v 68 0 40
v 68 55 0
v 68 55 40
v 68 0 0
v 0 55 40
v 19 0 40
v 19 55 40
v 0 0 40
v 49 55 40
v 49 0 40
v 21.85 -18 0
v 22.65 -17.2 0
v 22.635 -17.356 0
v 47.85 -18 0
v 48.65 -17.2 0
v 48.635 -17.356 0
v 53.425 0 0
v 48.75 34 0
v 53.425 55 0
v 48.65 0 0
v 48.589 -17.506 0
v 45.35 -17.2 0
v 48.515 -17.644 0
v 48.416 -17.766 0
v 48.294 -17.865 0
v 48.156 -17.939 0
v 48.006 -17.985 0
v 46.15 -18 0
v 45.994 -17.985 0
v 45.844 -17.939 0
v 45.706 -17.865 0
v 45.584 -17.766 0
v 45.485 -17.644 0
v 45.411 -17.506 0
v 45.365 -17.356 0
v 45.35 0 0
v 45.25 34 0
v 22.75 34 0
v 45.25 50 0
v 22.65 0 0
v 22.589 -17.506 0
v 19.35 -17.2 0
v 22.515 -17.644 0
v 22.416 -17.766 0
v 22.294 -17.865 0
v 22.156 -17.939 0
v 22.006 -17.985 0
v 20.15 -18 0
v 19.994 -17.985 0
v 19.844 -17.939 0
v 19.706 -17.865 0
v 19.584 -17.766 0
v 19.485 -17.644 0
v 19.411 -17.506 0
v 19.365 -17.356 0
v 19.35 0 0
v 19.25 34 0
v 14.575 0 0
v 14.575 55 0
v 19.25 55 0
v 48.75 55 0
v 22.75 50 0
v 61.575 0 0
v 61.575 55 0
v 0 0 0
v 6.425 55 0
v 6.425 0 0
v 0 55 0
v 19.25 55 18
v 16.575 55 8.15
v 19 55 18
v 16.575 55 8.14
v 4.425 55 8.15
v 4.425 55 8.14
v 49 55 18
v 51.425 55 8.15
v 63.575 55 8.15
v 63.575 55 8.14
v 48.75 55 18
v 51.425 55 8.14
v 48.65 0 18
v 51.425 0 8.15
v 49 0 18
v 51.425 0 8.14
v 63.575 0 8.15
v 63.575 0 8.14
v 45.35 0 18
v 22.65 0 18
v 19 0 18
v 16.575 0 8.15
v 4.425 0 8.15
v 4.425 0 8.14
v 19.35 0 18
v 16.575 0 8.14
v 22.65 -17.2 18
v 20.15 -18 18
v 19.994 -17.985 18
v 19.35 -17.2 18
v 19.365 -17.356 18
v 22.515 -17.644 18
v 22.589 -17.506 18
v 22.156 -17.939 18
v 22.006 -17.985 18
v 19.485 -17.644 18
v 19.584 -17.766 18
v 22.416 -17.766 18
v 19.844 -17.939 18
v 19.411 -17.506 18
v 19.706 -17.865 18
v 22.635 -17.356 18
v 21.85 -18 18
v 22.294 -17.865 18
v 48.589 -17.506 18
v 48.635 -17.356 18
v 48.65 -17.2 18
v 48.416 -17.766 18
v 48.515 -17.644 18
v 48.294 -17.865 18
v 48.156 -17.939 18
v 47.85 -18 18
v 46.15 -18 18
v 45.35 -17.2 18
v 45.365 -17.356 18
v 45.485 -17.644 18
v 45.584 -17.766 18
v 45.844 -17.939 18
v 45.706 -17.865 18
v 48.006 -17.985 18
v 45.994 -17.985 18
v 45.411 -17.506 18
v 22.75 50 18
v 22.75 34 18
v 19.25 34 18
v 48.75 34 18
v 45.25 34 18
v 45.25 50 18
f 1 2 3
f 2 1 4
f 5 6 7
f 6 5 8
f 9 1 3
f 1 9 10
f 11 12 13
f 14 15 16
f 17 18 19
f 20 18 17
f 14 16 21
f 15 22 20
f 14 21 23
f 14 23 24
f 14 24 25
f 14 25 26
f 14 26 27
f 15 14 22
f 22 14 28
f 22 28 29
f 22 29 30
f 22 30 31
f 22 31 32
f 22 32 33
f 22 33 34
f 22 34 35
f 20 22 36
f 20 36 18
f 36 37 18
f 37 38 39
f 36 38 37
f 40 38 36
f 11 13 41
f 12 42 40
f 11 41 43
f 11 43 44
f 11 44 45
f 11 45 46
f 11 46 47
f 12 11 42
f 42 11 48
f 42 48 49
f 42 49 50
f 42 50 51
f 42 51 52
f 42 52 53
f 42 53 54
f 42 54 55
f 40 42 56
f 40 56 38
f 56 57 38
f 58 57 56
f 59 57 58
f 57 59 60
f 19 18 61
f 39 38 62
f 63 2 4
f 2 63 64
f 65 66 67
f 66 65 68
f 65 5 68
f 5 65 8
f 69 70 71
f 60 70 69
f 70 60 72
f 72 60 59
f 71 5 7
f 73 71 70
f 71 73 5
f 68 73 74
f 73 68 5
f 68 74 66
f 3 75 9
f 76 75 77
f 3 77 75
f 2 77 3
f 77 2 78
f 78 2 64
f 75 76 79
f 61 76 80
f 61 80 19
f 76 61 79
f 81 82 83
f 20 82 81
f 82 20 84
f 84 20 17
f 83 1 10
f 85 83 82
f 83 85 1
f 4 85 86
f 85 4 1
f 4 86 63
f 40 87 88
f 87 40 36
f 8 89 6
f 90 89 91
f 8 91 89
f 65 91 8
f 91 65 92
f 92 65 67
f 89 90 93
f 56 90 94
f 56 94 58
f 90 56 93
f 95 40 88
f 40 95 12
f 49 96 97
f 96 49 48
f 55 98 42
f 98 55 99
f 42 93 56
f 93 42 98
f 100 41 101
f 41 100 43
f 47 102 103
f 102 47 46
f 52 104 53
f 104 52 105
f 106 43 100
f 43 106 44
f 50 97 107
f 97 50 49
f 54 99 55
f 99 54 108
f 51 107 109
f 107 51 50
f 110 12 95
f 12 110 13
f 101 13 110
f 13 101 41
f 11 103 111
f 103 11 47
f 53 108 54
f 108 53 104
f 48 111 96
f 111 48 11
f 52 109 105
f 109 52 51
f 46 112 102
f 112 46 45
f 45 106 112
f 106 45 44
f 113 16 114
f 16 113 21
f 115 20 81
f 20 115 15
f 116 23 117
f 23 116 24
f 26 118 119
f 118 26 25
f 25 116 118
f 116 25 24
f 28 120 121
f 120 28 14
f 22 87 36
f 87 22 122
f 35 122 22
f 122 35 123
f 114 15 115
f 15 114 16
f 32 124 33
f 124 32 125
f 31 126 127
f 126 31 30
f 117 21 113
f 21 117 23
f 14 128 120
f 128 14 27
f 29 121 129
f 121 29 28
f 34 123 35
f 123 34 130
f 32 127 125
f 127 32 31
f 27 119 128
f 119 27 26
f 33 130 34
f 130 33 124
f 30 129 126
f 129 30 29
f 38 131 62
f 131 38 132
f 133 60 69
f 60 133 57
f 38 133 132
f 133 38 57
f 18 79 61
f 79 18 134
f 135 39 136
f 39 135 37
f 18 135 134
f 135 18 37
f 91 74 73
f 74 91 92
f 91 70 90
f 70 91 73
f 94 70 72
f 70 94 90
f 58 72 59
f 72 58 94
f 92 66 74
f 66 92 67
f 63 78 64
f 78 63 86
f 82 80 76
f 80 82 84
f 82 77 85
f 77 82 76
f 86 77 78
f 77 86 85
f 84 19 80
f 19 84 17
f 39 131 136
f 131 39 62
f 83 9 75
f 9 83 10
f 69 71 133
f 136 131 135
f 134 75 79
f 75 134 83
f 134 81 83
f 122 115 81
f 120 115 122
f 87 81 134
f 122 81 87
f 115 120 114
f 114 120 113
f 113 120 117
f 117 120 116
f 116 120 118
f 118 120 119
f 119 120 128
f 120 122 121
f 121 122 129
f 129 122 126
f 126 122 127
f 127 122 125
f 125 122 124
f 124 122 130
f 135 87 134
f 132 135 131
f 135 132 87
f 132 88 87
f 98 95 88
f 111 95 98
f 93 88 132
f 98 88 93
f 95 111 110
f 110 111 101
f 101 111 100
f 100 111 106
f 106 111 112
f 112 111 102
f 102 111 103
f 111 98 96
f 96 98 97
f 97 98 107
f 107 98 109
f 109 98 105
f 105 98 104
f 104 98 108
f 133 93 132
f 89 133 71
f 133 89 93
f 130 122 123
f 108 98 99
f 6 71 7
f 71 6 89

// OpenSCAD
// ============================================================
// Portasplit End Cap — Top and Bottom finishing pieces
// Siegenia HS GR 260 sliding door rail
// ============================================================
//
// Set `part` to generate either cap:
//   "top"    — dovetail groove on bottom face (female), flat top face
//   "bottom" — dovetail tongue on top face (male), flat bottom face
//
// The terminal face (top for "bottom" cap, bottom for "top" cap)
// can have one or two through-holes running the full Y depth
// (door-tenon side through to wall side).  These replace the
// dovetail that would exist on a middle piece at that position.
//
// No hose slot — end caps do not pass the Portasplit hose.
// All other dimensions identical to default-adapter.scad.

// ── Which piece to generate ──────────────────────────────
part = "top";   // "top" | "bottom"

// ── Piece dimensions ──────────────────────────────────────
width  = 68;
depth  = 55;
height = 40;

// ── Door-side tenons ──────────────────────────────────────
tenon_w        = 3.3;
tenon_d        = 18;
tenon_h        = height;
tenon_corner_r = 0.8;
tenon_spacing  = 26;

// ── Wall-side mortises ────────────────────────────────────
mortise_w              = 3.5;
mortise_d              = 30;
ear_d                  = 0;
inner_tenon_d          = 5;
mortise_inner_d        = 21;
mortise_end_h          = 5;
mortise_spacing        = 26;

// ── Wall-side structural details ──────────────────────────
mortise_wall_thickness = 3.5;
channel_w              = 15;

// ── Dovetail tongue / groove ──────────────────────────────
tongue_h     = 8;
tongue_w_top = 12;
tongue_w_bot = 8;

// ── Tolerance (PETG) ─────────────────────────────────────
tolerance = 0.15;

// ── Through-hole on terminal face ────────────────────────
// Single centered hole running the full Y axis: from tenon tips
// (-tenon_d) through to the wall face (+depth).
// Placed on the face OPPOSITE the dovetail:
//   "bottom" cap → bottom face (Z = 0)
//   "top"    cap → top face    (Z = height)
through_hole  = true;   // enable / disable
hole_w        = 30;     // hole width in X [mm]
hole_h_top    = 22;     // hole height in Z for top cap    [mm]
hole_h_bottom = 15;     // hole height in Z for bottom cap [mm]

hole_h = (part == "top") ? hole_h_top : hole_h_bottom;

// ── Derived positions ─────────────────────────────────────
tenon_left_x  = width / 2 - tenon_spacing / 2;
tenon_right_x = width / 2 + tenon_spacing / 2;

tongue_left_center_x  = tenon_left_x / 2;
tongue_right_center_x = tenon_right_x + (width - tenon_right_x) / 2;

mortise_left_x  = width / 2 - mortise_spacing / 2;
mortise_right_x = width / 2 + mortise_spacing / 2;
channel_x_min   = mortise_left_x + mortise_w / 2 + mortise_wall_thickness;
channel_x_max   = mortise_right_x - mortise_w / 2 - mortise_wall_thickness;

inner_wall_d = depth - 5;

// Z start of through-hole — opposite face from the dovetail
// "bottom" cap: dovetail on top  → hole on bottom face (Z = 0)
// "top"    cap: dovetail on bottom → hole on top face (Z = height - hole_h)
hole_z0 = (part == "bottom") ? 0 : height - hole_h;

// ============================================================
// COMPONENT MODULES  (identical to default-adapter.scad)
// ============================================================

module door_tenon(x_pos) {
    r = tenon_corner_r;
    translate([x_pos - tenon_w / 2, -tenon_d, 0])
        hull() {
            translate([r,         r, 0]) cylinder(r=r, h=tenon_h, $fn=32);
            translate([tenon_w-r, r, 0]) cylinder(r=r, h=tenon_h, $fn=32);
            translate([0, tenon_d - 0.01, 0]) cube([tenon_w, 0.01, tenon_h]);
        }
}

module exterior_ear(mortise_x, side, z_pos) {
    ear_x = (side == "left")
        ? mortise_x - mortise_w / 2 - 5
        : mortise_x + mortise_w / 2;
    ear_z = (z_pos == "top")
        ? height - mortise_end_h
        : 0;
    translate([ear_x, depth, ear_z])
        cube([5, ear_d, mortise_end_h]);
}

module dovetail_tongue(tongue_center_x) {
    translate([tongue_center_x, 0, height])
        hull() {
            translate([-tongue_w_bot / 2, 0, 0])
                cube([tongue_w_bot, depth, 0.01]);
            translate([-tongue_w_top / 2, 0, tongue_h - 0.01])
                cube([tongue_w_top, depth, 0.01]);
        }
}

module dovetail_groove(tongue_center_x) {
    translate([tongue_center_x, -1, 0])
        hull() {
            translate([-(tongue_w_bot + tolerance) / 2, 0, 0])
                cube([tongue_w_bot + tolerance, depth + 2, 0.01]);
            translate([-(tongue_w_top + tolerance) / 2, 0, tongue_h + tolerance - 0.01])
                cube([tongue_w_top + tolerance, depth + 2, 0.01]);
        }
}

// Single centered through-hole running full Y depth.
// Rectangular cross-section: hole_w (X) × hole_h (Z).
module through_hole_cut() {
    y0 = -tenon_d - 1;         // start beyond tenon tips
    yl = depth + tenon_d + 2;  // full Y span including tenon protrusion
    translate([width / 2 - hole_w / 2, y0, hole_z0])
        cube([hole_w, yl, hole_h]);
}

// ============================================================
// MAIN
// ============================================================

module end_cap() {
    difference() {
        union() {
            cube([width, depth, height]);

            door_tenon(tenon_left_x);
            door_tenon(tenon_right_x);

            for (mortise_x = [mortise_left_x, mortise_right_x]) {
                exterior_ear(mortise_x, "left",  "top");
                exterior_ear(mortise_x, "left",  "bottom");
                exterior_ear(mortise_x, "right", "top");
                exterior_ear(mortise_x, "right", "bottom");
            }

            // "bottom" cap: tongue on top face connects to the piece above
            if (part == "bottom") {
                dovetail_tongue(tongue_left_center_x);
                dovetail_tongue(tongue_right_center_x);
            }
        }

        // Inner wall slots
        translate([mortise_left_x + mortise_w / 2, inner_wall_d, -1])
            cube([mortise_wall_thickness, depth - inner_wall_d + 1, height + 2]);
        translate([channel_x_max, inner_wall_d, -1])
            cube([mortise_wall_thickness, depth - inner_wall_d + 1, height + 2]);

        // Wall-side mortises
        for (mortise_x = [mortise_left_x, mortise_right_x]) {
            translate([mortise_x - mortise_w / 2, depth - mortise_inner_d, -1])
                cube([mortise_w, mortise_inner_d + 1, height + 2]);
        }

        // Wall-side center channel
        translate([channel_x_min, depth - inner_tenon_d, -1])
            cube([channel_x_max - channel_x_min, inner_tenon_d + 1, height + 2]);

        // "top" cap: groove on bottom face receives the tongue from the piece below
        if (part == "top") {
            dovetail_groove(tongue_left_center_x);
            dovetail_groove(tongue_right_center_x);
        }

        // Through-hole on terminal face (opposite side from dovetail)
        if (through_hole)
            through_hole_cut();
    }
}

end_cap();
